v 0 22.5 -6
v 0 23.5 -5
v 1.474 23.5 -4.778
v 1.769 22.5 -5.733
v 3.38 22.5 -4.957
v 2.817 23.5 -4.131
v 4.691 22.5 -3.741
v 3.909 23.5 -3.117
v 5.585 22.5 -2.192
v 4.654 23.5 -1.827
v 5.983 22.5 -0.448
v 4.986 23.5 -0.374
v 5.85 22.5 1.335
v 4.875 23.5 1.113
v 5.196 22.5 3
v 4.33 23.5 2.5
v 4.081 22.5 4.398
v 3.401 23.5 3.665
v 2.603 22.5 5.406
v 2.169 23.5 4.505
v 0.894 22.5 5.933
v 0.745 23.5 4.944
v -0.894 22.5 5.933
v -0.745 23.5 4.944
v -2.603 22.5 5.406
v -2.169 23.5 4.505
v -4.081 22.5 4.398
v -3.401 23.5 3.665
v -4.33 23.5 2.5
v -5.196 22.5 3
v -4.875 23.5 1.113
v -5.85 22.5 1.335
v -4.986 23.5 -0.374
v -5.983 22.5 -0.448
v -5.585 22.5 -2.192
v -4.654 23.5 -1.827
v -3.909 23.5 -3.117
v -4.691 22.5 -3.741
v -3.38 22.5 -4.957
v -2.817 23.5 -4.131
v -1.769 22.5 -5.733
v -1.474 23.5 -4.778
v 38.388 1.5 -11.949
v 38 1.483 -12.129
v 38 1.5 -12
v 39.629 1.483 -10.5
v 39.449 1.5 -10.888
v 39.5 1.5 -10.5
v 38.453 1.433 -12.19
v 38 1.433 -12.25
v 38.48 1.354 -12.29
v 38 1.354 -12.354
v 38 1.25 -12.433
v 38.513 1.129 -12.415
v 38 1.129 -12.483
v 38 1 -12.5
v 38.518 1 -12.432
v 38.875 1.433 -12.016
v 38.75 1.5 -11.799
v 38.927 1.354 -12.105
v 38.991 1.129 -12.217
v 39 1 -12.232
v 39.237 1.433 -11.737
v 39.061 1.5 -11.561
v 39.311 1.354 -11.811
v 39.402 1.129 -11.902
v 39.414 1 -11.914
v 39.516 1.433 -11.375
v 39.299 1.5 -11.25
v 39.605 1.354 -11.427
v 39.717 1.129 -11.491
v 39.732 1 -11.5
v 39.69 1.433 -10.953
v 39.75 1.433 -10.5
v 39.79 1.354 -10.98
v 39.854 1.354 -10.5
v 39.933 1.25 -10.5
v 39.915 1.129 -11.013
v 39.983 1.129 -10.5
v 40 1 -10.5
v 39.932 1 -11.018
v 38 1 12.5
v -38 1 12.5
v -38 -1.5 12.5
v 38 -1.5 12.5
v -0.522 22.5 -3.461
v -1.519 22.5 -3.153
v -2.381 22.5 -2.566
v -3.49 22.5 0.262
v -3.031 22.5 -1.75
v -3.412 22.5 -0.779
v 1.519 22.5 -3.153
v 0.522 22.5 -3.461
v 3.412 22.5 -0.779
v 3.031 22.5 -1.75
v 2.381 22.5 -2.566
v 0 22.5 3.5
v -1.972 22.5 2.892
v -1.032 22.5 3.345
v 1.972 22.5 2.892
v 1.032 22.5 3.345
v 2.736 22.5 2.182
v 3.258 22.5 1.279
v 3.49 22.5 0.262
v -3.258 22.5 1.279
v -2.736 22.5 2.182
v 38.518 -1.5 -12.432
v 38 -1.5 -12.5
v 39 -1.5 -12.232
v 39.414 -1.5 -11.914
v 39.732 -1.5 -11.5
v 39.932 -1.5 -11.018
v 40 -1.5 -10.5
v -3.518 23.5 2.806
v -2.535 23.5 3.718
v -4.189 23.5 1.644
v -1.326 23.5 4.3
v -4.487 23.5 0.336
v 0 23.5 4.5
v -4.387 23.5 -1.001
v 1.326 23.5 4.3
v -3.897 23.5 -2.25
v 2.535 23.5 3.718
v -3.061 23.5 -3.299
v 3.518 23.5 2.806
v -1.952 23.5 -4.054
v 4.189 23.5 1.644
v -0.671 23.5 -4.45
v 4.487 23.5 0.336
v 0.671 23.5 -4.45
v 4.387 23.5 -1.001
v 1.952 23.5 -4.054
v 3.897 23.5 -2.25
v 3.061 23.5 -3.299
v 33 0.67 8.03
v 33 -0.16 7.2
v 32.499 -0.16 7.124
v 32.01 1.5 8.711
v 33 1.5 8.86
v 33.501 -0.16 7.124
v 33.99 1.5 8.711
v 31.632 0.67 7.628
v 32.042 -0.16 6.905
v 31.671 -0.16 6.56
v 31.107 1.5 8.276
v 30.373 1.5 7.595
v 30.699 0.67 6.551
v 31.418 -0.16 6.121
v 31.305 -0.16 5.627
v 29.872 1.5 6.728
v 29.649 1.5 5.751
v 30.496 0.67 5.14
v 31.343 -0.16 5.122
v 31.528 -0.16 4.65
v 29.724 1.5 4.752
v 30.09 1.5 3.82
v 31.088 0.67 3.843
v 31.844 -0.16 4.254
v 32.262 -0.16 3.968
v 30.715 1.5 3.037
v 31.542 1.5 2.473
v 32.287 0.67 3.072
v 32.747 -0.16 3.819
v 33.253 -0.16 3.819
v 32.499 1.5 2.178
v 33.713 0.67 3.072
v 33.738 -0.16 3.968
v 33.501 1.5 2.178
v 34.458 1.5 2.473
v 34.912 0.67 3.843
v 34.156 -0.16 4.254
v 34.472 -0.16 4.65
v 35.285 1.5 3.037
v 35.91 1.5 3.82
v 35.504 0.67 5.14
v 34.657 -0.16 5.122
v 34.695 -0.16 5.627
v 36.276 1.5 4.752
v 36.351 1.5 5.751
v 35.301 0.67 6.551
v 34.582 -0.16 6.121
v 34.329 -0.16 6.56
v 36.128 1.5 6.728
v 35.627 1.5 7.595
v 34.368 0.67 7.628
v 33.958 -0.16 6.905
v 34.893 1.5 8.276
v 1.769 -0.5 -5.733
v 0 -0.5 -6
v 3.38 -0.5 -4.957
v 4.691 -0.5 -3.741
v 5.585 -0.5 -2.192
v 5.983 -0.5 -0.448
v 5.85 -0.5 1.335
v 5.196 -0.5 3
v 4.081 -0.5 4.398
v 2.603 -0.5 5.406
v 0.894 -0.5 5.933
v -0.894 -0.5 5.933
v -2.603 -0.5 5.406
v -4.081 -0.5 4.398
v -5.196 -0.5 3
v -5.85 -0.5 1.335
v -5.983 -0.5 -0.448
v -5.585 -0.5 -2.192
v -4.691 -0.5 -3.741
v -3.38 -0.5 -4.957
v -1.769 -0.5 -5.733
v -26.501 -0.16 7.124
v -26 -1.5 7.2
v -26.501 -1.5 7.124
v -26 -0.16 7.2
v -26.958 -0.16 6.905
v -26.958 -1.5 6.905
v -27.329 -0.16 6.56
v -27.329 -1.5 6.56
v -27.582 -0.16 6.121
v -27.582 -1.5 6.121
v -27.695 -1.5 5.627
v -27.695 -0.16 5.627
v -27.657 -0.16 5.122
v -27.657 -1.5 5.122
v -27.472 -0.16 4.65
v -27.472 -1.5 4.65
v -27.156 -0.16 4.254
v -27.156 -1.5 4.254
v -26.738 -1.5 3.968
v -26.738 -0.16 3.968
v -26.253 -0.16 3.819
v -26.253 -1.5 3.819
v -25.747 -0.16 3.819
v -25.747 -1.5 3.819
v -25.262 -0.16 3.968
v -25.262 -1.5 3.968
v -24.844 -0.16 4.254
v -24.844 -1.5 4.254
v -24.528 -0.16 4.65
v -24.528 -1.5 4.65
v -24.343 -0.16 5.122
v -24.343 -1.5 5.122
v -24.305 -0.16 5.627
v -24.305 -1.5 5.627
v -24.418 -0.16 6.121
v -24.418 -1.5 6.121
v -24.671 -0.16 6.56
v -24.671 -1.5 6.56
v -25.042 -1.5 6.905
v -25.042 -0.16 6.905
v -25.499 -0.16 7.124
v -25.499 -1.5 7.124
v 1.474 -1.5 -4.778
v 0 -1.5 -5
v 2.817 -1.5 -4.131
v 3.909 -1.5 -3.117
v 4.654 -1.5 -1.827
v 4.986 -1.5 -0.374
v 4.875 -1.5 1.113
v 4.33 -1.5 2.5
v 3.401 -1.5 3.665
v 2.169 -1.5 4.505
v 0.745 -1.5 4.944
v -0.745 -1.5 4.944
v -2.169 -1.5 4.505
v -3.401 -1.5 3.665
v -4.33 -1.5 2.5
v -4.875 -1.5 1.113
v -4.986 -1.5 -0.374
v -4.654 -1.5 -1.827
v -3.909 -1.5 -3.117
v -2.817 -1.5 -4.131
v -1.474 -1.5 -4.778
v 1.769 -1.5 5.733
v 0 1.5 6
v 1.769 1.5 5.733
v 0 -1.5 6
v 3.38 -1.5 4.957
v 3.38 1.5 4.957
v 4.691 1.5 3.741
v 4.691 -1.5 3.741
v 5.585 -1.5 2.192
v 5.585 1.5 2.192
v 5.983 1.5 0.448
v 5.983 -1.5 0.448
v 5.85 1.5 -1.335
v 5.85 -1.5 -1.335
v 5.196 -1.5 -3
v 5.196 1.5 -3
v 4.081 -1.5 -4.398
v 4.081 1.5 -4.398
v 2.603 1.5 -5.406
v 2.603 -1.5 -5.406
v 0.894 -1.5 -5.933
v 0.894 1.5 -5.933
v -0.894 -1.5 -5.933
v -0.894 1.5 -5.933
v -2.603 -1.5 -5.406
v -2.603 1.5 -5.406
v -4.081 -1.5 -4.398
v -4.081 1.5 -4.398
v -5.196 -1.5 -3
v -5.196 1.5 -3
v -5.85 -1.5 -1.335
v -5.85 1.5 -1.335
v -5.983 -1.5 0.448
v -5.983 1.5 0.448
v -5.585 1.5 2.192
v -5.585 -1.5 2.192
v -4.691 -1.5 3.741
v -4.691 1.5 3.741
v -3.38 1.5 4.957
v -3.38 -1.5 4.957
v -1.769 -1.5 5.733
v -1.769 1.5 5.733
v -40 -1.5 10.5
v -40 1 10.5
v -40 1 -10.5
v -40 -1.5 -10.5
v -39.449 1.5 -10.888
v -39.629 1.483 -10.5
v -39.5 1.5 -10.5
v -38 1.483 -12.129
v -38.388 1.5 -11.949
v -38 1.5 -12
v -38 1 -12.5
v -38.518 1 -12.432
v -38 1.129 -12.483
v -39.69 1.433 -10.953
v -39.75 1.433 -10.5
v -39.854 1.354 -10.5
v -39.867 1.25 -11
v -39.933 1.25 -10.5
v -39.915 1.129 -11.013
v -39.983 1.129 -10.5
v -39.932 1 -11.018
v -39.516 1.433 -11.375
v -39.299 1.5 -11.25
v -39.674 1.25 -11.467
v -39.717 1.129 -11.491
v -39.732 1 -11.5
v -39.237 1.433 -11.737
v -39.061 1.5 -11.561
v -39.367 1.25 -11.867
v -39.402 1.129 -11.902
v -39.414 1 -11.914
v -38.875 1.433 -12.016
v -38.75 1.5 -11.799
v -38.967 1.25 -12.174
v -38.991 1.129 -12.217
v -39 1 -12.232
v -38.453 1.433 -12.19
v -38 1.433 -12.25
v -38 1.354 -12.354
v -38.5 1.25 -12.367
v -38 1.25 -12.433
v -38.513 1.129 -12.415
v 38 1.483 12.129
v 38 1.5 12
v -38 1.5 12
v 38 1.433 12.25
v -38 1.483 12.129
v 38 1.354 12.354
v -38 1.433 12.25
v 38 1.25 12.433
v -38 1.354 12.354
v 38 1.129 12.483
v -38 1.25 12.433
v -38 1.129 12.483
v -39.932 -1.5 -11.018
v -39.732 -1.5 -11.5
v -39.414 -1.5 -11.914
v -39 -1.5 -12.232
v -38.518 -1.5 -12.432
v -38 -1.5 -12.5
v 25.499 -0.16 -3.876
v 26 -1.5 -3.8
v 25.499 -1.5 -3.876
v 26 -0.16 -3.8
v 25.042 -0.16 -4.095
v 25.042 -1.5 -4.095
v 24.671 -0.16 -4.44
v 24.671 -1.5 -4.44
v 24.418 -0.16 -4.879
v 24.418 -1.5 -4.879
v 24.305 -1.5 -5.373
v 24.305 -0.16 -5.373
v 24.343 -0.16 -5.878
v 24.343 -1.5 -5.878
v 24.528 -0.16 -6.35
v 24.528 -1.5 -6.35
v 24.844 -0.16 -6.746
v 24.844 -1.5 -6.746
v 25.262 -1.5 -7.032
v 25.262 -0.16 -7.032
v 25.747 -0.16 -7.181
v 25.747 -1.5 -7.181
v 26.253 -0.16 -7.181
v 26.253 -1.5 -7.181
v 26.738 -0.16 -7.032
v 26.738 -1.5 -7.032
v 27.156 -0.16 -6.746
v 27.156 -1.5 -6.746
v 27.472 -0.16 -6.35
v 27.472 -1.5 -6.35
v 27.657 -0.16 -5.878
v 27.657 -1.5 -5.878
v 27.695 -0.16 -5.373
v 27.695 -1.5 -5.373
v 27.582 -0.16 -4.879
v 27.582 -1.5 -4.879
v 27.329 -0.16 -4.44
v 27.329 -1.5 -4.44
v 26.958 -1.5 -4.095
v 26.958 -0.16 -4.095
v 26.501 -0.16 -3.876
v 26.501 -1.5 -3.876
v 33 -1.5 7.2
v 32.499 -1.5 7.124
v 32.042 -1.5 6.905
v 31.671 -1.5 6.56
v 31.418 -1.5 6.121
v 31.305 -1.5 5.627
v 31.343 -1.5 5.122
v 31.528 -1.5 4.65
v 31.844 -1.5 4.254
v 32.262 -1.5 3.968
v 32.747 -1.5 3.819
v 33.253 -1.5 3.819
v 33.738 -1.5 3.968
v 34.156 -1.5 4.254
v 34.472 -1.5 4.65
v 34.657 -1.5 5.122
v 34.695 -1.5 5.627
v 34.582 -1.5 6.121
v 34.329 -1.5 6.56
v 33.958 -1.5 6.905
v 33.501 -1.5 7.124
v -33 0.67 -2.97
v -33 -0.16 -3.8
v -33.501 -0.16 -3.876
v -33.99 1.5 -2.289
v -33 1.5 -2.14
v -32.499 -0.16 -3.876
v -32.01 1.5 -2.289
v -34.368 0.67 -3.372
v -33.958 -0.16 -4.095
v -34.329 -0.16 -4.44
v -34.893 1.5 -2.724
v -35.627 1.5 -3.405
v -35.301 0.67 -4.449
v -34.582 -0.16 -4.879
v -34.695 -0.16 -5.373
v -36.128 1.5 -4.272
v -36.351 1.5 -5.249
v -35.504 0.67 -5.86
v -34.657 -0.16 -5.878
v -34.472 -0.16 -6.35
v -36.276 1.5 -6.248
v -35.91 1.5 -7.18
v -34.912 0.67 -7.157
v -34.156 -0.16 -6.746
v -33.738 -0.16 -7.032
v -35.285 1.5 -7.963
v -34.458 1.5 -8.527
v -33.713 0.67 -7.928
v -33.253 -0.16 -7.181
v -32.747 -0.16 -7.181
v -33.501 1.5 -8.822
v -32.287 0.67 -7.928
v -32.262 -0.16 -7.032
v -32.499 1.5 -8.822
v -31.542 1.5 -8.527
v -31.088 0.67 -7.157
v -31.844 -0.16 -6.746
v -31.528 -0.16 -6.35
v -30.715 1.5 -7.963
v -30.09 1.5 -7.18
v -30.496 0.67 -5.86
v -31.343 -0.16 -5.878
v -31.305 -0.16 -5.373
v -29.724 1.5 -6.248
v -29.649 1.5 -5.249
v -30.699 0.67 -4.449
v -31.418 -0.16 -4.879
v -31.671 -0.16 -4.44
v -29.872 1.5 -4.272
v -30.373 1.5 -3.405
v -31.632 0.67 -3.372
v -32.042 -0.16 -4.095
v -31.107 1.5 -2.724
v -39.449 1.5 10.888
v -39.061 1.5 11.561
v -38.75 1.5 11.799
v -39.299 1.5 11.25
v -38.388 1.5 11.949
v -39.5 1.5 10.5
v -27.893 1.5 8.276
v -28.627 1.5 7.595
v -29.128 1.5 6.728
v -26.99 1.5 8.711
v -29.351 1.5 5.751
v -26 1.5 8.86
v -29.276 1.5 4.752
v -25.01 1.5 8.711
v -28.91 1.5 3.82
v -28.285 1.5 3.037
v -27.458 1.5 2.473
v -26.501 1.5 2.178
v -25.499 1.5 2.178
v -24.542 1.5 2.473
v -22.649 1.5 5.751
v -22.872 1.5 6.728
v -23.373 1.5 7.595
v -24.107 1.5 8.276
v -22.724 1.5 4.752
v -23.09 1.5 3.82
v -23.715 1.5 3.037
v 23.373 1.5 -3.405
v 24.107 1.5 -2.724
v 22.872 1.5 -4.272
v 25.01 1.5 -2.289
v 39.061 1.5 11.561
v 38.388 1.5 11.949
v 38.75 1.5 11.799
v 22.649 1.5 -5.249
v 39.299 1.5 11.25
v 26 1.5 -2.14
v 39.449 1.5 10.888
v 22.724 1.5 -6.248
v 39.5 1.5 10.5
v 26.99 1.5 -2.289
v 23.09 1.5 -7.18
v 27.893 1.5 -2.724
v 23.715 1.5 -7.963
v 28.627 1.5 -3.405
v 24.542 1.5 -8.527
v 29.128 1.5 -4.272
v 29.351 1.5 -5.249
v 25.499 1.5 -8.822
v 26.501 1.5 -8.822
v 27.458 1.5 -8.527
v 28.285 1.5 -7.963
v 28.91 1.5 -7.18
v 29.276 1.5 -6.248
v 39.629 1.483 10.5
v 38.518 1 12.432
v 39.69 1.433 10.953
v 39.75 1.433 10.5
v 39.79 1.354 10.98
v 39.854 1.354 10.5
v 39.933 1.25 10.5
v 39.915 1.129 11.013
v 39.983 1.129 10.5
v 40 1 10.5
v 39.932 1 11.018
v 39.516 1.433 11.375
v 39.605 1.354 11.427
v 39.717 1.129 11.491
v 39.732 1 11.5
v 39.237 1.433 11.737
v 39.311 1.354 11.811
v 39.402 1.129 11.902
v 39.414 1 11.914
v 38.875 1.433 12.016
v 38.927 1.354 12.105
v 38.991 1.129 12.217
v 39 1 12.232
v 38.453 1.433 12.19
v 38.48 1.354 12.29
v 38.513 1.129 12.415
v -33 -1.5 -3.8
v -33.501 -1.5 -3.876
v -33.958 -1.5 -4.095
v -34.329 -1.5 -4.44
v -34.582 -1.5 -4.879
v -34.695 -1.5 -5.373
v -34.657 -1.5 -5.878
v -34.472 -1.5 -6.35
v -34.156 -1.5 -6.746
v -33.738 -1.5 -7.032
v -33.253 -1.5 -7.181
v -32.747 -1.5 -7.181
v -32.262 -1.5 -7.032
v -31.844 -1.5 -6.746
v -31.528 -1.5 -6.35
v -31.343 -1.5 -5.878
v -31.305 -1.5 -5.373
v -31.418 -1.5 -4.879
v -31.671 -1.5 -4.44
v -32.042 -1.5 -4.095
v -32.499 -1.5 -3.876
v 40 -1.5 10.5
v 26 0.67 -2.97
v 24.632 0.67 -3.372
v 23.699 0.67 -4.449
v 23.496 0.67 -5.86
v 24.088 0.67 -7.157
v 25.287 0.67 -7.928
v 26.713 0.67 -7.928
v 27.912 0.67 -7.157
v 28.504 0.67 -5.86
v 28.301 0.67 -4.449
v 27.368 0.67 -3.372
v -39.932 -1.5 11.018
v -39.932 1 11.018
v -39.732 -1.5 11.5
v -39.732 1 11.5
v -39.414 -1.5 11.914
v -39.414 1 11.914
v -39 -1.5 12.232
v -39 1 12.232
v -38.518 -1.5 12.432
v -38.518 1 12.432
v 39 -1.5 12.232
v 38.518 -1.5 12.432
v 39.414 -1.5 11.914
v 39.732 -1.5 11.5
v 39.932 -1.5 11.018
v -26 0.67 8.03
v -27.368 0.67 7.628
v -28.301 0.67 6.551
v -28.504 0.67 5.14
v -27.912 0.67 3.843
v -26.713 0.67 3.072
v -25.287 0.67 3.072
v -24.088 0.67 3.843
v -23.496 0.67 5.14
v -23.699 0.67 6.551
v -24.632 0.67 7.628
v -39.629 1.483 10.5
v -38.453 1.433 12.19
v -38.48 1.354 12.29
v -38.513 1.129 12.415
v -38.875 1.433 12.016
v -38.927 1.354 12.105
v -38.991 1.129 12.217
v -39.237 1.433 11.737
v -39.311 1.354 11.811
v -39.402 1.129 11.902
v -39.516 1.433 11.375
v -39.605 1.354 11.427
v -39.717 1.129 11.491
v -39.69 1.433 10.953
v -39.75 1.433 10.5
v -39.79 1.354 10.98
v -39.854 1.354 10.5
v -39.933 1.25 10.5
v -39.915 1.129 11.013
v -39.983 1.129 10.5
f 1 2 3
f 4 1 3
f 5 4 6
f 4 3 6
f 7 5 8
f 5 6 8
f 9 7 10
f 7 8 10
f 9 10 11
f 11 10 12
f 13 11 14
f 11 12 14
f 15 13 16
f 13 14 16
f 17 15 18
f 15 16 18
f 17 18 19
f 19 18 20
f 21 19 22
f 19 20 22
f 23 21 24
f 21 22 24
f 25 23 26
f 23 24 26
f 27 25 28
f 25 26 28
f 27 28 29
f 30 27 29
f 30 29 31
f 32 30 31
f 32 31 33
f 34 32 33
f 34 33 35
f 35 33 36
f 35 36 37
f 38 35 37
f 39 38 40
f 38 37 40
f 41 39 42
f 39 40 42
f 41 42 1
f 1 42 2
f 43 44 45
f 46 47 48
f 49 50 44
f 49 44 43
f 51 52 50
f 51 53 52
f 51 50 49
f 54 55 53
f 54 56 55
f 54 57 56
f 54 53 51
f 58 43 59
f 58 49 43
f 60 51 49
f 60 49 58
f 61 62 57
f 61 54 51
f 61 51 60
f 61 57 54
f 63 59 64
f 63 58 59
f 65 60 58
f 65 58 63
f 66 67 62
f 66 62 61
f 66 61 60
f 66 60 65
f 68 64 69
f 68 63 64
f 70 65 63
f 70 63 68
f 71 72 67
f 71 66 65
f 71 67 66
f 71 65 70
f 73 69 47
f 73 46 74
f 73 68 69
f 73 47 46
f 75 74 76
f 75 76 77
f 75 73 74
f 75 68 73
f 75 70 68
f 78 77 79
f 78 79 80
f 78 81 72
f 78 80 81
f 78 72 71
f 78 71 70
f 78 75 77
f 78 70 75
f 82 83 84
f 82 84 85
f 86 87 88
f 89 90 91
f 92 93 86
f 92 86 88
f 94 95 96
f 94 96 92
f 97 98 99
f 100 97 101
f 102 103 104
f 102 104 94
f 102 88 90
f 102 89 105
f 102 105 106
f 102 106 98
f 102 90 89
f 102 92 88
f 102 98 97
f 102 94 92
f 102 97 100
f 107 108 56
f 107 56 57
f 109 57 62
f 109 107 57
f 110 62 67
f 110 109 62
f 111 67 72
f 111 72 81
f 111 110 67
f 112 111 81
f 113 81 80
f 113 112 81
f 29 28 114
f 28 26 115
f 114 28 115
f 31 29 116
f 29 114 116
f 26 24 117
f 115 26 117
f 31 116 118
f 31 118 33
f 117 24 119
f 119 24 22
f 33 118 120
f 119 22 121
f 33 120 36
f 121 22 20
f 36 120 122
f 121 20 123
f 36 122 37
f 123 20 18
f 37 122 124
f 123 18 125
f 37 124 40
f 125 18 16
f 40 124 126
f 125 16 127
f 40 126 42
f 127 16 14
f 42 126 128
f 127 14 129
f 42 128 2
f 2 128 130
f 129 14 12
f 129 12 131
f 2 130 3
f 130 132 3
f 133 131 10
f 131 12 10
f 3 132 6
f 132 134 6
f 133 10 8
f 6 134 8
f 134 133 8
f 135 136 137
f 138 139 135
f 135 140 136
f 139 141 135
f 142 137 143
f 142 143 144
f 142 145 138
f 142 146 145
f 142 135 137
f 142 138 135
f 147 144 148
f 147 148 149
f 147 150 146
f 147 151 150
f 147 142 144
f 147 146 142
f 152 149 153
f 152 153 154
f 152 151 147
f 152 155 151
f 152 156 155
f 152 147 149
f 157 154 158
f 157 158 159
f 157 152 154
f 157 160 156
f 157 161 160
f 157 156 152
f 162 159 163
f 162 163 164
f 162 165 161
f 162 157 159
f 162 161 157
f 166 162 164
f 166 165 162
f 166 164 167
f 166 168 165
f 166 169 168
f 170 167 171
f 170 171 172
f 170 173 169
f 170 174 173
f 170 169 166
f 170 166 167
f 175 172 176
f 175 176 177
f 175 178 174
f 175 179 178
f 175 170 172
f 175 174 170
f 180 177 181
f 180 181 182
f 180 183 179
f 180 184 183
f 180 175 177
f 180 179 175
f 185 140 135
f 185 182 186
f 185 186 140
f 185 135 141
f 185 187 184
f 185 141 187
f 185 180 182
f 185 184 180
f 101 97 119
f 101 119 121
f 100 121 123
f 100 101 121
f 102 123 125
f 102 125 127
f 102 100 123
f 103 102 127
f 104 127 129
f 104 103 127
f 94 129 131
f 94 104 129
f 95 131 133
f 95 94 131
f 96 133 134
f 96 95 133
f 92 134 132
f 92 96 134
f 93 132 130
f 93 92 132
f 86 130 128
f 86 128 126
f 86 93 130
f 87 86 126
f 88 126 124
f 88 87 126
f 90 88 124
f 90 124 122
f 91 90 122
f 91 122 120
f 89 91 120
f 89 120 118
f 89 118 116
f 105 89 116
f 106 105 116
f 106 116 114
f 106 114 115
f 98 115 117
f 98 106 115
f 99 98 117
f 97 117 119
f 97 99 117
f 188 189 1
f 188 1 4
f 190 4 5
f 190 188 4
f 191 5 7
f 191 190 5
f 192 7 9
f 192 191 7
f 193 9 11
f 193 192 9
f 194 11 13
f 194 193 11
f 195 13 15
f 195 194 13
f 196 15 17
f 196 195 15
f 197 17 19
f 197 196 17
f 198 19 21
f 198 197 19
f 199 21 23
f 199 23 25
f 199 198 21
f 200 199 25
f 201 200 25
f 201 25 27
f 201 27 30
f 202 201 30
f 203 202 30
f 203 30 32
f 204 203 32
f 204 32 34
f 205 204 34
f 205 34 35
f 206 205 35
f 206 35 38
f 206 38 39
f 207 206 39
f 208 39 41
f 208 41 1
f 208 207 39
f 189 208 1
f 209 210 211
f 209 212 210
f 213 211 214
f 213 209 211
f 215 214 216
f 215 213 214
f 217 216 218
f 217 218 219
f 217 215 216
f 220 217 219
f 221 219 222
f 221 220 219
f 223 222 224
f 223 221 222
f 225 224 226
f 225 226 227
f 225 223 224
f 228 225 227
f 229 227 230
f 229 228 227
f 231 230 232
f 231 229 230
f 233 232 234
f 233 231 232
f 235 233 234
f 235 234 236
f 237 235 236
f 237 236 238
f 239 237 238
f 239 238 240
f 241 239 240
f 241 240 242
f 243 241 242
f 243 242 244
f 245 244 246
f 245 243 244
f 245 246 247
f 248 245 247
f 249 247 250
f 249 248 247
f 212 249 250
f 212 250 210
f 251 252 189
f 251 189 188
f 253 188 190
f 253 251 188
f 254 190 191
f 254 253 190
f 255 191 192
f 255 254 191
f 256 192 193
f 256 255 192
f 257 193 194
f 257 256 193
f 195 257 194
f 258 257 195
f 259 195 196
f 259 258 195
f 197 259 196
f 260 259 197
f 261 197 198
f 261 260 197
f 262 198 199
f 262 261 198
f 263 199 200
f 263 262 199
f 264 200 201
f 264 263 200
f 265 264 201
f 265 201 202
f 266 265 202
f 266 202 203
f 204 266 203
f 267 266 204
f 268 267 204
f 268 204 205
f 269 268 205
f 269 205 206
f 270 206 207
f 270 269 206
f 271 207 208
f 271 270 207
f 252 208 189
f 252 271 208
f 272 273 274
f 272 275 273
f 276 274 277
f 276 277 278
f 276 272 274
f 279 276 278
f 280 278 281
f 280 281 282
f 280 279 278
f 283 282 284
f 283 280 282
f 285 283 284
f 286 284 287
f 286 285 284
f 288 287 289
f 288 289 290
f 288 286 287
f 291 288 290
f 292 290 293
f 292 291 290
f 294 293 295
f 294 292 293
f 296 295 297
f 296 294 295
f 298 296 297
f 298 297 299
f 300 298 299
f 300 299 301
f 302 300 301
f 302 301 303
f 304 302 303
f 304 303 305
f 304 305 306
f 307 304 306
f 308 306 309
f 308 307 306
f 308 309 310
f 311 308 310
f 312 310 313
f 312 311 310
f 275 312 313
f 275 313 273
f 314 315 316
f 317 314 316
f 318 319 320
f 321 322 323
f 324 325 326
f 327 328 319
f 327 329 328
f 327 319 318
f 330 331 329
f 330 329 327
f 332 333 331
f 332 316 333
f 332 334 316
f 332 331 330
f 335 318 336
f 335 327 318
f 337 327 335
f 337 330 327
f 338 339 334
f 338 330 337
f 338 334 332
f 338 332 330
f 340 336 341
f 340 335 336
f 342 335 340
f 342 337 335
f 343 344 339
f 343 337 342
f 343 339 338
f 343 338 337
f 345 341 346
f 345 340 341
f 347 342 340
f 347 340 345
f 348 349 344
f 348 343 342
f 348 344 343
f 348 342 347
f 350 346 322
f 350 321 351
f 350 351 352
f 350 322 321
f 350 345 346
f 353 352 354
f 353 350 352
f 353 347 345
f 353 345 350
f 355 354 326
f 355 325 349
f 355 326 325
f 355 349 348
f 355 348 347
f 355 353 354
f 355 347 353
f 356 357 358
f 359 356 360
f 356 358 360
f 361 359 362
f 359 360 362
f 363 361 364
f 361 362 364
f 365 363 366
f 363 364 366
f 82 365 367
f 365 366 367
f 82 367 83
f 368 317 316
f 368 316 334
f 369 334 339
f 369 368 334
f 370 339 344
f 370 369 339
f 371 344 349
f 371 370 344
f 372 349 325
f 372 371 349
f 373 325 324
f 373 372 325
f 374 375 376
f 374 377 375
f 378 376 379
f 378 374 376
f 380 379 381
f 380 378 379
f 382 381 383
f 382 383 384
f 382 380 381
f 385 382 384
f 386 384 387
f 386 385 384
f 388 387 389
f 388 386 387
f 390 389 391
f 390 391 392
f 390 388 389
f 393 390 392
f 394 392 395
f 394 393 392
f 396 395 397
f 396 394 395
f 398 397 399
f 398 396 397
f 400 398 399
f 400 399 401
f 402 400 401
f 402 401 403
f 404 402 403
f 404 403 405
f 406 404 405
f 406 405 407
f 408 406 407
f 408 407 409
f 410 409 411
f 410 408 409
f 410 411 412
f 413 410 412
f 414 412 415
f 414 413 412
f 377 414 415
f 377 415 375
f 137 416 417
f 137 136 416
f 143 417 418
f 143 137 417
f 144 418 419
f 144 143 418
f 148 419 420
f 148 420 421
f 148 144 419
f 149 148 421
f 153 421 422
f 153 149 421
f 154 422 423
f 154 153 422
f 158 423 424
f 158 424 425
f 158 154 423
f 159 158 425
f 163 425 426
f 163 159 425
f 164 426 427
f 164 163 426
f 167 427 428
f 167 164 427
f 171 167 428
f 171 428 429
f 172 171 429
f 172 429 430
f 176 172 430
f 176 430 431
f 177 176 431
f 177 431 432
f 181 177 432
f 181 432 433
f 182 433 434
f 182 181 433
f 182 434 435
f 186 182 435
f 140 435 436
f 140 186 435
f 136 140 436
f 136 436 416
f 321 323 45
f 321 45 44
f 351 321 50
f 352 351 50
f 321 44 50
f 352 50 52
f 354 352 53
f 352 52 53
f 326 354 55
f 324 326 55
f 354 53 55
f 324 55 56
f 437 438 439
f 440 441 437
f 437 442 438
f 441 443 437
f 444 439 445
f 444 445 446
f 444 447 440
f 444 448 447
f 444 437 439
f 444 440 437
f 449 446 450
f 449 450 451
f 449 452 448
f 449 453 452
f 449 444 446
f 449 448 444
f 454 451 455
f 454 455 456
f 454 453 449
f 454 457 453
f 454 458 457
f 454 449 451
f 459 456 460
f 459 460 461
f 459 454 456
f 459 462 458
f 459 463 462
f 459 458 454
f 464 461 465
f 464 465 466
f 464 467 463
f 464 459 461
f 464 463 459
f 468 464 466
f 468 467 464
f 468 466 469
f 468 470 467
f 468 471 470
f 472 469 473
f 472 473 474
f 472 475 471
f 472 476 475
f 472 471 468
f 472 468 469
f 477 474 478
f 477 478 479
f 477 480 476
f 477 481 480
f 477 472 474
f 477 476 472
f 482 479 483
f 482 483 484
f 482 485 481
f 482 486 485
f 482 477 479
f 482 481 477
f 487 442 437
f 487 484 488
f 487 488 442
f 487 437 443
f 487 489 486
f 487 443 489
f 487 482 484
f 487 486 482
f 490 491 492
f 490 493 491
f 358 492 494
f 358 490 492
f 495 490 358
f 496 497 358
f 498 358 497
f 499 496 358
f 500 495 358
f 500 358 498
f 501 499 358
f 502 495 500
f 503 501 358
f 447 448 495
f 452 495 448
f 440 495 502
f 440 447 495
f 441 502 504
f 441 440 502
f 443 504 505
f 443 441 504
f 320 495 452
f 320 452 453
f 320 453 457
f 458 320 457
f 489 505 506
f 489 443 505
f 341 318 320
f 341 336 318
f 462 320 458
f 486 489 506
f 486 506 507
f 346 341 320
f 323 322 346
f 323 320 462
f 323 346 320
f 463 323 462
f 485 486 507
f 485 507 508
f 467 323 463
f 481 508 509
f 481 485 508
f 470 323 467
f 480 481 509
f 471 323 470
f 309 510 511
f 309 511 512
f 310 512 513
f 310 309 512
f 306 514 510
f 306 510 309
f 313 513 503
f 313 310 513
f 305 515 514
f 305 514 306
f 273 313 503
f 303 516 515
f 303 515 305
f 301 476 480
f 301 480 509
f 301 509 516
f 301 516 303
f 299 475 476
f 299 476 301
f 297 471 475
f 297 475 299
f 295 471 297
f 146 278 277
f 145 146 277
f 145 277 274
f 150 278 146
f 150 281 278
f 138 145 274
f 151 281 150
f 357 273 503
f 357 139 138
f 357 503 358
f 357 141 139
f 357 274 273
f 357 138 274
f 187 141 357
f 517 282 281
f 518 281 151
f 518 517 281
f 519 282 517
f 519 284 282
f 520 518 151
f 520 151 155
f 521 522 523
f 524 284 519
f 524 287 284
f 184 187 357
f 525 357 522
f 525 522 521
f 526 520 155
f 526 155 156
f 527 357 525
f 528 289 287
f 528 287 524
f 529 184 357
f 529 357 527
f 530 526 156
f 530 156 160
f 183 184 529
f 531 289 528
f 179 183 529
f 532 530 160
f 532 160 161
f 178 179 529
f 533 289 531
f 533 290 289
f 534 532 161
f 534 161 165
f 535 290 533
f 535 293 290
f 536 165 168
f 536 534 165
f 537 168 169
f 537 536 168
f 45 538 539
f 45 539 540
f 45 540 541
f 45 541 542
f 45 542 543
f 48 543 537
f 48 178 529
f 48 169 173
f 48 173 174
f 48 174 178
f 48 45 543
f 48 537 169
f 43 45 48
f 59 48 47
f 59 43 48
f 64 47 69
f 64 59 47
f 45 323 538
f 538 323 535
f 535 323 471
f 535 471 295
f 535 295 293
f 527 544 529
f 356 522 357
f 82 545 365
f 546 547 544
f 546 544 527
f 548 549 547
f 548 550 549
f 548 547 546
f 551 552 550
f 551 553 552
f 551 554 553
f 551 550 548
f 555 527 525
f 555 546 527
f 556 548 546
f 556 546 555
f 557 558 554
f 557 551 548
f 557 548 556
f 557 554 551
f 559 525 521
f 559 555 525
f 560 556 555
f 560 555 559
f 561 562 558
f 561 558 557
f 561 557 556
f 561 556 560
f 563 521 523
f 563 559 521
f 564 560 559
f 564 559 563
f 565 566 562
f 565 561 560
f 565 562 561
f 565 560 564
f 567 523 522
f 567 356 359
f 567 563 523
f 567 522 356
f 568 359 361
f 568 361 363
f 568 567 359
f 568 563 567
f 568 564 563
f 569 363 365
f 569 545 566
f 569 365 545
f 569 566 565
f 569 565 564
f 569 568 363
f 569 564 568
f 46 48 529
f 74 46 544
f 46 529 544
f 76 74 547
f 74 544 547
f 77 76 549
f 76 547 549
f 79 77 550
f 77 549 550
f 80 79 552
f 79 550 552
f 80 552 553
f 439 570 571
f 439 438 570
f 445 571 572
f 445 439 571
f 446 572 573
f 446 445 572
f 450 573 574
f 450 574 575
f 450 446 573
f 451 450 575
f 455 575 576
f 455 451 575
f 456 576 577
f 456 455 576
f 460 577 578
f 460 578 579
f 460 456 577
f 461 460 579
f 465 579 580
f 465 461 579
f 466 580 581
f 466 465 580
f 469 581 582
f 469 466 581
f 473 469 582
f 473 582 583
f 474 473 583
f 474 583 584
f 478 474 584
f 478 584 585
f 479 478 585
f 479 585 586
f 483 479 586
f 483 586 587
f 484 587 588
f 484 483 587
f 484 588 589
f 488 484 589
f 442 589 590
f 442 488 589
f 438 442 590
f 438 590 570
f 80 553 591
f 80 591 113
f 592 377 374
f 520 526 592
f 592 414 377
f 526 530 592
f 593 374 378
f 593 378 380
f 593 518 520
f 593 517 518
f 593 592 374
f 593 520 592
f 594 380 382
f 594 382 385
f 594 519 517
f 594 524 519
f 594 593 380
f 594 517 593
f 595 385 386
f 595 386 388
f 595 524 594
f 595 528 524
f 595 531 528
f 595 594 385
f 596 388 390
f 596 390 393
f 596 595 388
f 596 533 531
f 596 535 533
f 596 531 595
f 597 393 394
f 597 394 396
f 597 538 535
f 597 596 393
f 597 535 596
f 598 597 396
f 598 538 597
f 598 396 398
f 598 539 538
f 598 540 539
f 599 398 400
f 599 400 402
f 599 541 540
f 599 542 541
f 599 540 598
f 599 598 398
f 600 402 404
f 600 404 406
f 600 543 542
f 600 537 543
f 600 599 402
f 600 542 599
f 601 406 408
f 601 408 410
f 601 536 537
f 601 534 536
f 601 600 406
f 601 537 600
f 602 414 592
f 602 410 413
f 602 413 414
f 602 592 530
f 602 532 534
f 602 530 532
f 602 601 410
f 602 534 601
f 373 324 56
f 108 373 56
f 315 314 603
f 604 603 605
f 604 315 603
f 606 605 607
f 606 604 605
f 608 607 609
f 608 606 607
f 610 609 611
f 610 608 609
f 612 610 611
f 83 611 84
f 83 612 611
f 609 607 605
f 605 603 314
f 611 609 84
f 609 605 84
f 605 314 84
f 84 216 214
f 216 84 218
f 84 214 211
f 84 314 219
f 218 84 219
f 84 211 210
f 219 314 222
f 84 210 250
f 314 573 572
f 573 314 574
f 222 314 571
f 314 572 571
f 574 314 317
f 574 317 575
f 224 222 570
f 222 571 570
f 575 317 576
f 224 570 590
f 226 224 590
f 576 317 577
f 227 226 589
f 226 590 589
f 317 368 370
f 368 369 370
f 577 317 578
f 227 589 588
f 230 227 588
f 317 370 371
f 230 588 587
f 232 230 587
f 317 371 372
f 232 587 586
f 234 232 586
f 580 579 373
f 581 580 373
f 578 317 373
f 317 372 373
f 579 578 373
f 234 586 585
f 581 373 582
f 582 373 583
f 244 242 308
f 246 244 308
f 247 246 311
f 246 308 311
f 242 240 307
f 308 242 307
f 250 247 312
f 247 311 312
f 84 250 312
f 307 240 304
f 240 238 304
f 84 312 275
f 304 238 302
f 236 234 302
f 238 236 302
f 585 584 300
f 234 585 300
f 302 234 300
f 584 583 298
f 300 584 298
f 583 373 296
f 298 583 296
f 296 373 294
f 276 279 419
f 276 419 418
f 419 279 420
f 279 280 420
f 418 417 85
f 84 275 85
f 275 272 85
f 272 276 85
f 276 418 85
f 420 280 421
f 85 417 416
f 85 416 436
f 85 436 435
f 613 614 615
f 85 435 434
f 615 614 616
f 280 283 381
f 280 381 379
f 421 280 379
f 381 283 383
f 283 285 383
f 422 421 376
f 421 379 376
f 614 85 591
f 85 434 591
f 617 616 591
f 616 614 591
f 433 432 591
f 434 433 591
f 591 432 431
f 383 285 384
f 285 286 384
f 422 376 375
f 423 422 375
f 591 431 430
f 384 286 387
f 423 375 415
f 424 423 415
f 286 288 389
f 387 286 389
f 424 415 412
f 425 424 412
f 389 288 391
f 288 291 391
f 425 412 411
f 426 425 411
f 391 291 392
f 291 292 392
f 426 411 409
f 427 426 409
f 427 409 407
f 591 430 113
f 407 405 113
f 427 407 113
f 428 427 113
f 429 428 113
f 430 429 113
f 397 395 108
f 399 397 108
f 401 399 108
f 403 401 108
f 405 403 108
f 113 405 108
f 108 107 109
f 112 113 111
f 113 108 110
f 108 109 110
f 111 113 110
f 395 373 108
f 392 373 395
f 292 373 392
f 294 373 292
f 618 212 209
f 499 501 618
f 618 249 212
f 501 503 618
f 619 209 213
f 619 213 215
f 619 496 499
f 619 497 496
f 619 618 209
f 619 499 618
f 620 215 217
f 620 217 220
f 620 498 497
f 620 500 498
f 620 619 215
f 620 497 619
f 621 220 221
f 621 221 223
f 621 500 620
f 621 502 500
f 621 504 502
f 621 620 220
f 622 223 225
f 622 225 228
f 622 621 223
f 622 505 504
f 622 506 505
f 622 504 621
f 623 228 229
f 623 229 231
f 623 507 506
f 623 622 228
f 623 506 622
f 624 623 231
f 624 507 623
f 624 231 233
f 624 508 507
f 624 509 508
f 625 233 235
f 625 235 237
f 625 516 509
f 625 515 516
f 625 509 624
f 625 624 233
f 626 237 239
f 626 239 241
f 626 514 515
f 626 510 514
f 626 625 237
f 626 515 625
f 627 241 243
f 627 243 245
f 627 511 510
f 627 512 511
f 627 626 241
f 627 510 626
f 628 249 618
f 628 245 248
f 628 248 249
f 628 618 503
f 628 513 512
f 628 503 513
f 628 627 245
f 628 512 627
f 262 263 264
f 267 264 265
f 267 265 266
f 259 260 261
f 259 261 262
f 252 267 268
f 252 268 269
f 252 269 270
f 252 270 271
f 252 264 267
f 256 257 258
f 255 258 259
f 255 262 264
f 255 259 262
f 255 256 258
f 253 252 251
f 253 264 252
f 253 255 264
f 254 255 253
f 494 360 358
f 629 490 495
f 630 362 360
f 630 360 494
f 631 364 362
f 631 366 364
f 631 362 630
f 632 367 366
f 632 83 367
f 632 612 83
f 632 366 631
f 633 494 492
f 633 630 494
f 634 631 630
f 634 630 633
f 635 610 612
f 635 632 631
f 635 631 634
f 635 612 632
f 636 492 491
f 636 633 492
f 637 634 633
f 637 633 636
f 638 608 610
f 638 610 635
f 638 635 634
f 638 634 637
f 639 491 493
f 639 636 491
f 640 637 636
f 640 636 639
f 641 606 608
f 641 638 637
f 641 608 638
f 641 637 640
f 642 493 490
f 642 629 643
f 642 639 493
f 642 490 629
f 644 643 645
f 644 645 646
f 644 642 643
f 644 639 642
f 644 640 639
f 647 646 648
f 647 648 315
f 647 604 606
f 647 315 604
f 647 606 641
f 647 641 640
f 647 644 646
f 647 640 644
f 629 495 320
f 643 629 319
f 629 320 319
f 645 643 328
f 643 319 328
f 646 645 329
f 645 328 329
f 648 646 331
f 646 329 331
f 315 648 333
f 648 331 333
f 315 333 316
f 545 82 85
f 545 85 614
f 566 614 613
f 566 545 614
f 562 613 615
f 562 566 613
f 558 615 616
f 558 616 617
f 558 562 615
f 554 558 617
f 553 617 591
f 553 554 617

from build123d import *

# Parameters (mm, degrees)
ESBO_O1_W                           = 80
ESBO_O1_H                           = 25
ESBO_O1_R                           = 6
RESSALTO_EXTRUS_O1_DEPTH            = 1.5
ESBO_O3_R                           = 6
RESSALTO_EXTRUS_O3_DEPTH            = 25
CHANFRO1_SIZE                       = 1
ESCAREADO_PARA_SFHCS_M31_AT_2_COUNT = 2
ESCAREADO_PARA_SFHCS_M31_AT_2_PITCH = 13.03840481
ESCAREADO_PARA_SFHCS_M31_AT_3_COUNT = 2
ESCAREADO_PARA_SFHCS_M31_AT_3_PITCH = 59
ESCAREADO_PARA_SFHCS_M31_AT_4_COUNT = 2
ESCAREADO_PARA_SFHCS_M31_AT_4_PITCH = 66.910387833
FILETE1_R                           = 2
FILETE2_R                           = 0.5
ESBO_O7_R                           = 4.5
CORTE_EXTRUS_O1_DEPTH               = 1
CHANFRO2_SIZE                       = 1


with BuildPart() as part:
    # Esboço1 → Ressalto-extrusão1 (new, symmetric)
    with BuildSketch(Plane(origin=(0, 0, 0), x_dir=(1, 0, 0), z_dir=(0, 1, 0))):
        Rectangle(ESBO_O1_W, ESBO_O1_H)
        with Locations(Location((0, 0, 0), (0, 0, 270))):
            Circle(ESBO_O1_R, mode=Mode.SUBTRACT)
    extrude(amount=RESSALTO_EXTRUS_O1_DEPTH, both=True)

    # Esboço6 → Escareado para SFHCS M31 (revolve, cut)
    with BuildSketch(Plane(origin=(-33, 1.5, -5.5), x_dir=(0, 0, 1), z_dir=(1, 0, 0))):
        Polygon((0, 0), (0, 3), (1.7, 3), (1.7, 1.66), (3.36, 0), align=None)
    escareado_para_sfhcs_m31 = revolve(axis=Axis((-33, 7.85, -5.5), (0, -1, 0)), mode=Mode.SUBTRACT)

    # Escareado para SFHCS M31 at 2: Escareado para SFHCS M31 ×2
    with Locations(*[Vector(0.5368754921931594, 0, 0.8436614877321075) * (i * ESCAREADO_PARA_SFHCS_M31_AT_2_PITCH) for i in range(1, ESCAREADO_PARA_SFHCS_M31_AT_2_COUNT)]):
        add(escareado_para_sfhcs_m31, mode=Mode.SUBTRACT)

    # Escareado para SFHCS M31 at 3: Escareado para SFHCS M31 ×2
    with Locations(*[(i * ESCAREADO_PARA_SFHCS_M31_AT_3_PITCH, 0, 0) for i in range(1, ESCAREADO_PARA_SFHCS_M31_AT_3_COUNT)]):
        add(escareado_para_sfhcs_m31, mode=Mode.SUBTRACT)

    # Escareado para SFHCS M31 at 4: Escareado para SFHCS M31 ×2
    with Locations(*[Vector(0.9863939238321439, 0, 0.16439898730535732) * (i * ESCAREADO_PARA_SFHCS_M31_AT_4_PITCH) for i in range(1, ESCAREADO_PARA_SFHCS_M31_AT_4_COUNT)]):
        add(escareado_para_sfhcs_m31, mode=Mode.SUBTRACT)

    # Filete1
    filete1_edges = [part.edges().sort_by_distance(p)[0] for p in [
        (40, 0, 12.5),
        (-40, 0, 12.5),
        (-40, 0, -12.5),
        (40, 0, -12.5),
    ]]
    fillet(filete1_edges, radius=FILETE1_R)

    # Filete2
    filete2_edges = [part.edges().sort_by_distance(p)[0] for p in [
        (0, 1.5, -12.5),
        (40, 1.5, 0),
        (-40, 1.5, 0),
        (0, 1.5, 12.5),
        (-39.414213562, 1.5, 11.914213562),
        (-39.414213562, 1.5, -11.914213562),
        (39.414213562, 1.5, 11.914213562),
        (39.414213562, 1.5, -11.914213562),
    ]]
    fillet(filete2_edges, radius=FILETE2_R)


with BuildPart() as body_2:
    # Esboço3 → Ressalto-extrusão3 (new body)
    with BuildSketch(Plane.XZ.offset(1.5)):
        with Locations(Location((0, 0, 0), (0, 0, 270))):
            Circle(ESBO_O3_R)
    extrude(amount=-RESSALTO_EXTRUS_O3_DEPTH)

    # Chanfro1
    chanfro1_edges = [body_2.edges().sort_by_distance(p)[0] for p in [
        (0, -1.5, 6),
        (0, 23.5, 6),
    ]]
    chamfer(chanfro1_edges, length=CHANFRO1_SIZE)

    # Esboço7 → Corte-extrusão1 (cut)
    with BuildSketch(Plane(origin=(0, 23.5, 0), x_dir=(1, 0, 0), z_dir=(0, 1, 0))):
        with Locations(Location((0, 0, 0), (0, 0, 270))):
            Circle(ESBO_O7_R)
    extrude(amount=-CORTE_EXTRUS_O1_DEPTH, mode=Mode.SUBTRACT)

    # Chanfro2
    chanfro2_edges = [body_2.edges().sort_by_distance(p)[0] for p in [
        (0, 22.5, -4.5),
    ]]
    chamfer(chanfro2_edges, length=CHANFRO2_SIZE - 0.0001)  # a hair under: the kernel refuses the full size


solid = Compound([part.part, body_2.part])
